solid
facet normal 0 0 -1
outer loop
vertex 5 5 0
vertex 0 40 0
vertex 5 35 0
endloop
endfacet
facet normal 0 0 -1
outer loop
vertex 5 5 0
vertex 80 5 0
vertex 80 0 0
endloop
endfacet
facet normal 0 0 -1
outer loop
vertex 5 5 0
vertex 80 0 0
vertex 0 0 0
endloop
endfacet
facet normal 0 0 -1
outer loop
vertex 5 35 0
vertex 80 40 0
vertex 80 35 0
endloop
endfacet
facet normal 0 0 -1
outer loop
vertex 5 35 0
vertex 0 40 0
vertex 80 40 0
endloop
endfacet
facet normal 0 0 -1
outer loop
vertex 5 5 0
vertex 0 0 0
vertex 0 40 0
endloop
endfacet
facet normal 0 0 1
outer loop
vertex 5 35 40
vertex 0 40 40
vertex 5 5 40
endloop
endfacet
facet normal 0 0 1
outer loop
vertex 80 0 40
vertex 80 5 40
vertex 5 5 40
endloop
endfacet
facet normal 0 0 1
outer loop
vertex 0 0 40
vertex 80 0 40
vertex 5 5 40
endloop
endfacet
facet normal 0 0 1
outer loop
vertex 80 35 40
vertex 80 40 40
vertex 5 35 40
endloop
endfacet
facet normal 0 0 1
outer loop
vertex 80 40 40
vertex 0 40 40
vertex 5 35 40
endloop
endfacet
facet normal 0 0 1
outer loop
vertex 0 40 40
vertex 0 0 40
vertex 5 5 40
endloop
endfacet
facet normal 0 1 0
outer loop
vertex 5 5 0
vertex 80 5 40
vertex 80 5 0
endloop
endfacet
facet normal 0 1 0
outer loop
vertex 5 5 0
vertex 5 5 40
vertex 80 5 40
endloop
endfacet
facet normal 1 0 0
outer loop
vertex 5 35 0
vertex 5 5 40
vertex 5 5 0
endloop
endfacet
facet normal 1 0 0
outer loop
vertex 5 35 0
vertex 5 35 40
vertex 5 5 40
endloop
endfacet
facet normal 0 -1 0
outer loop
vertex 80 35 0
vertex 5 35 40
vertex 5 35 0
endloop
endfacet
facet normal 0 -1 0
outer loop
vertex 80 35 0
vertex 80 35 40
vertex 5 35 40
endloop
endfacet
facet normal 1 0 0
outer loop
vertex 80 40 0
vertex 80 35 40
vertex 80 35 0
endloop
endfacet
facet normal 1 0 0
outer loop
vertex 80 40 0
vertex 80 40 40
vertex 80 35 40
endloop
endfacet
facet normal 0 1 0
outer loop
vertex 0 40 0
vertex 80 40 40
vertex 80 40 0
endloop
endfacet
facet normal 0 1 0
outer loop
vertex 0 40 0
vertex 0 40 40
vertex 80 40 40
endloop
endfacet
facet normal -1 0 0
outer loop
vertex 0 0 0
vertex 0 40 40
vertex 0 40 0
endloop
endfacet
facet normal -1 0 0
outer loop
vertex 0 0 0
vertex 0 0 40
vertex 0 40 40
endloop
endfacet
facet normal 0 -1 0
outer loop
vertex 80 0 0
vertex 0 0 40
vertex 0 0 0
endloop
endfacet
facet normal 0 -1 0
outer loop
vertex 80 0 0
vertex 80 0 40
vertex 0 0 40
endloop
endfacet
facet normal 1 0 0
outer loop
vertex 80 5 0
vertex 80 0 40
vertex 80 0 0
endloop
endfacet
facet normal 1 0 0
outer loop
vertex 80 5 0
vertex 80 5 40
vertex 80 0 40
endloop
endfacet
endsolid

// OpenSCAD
$fn = 32;

// ----------------------------------------------------------------------
// Structural section: channel 80 x 40 mm
// ----------------------------------------------------------------------

// --- parameters (mm) ---
sec_w = 80;               // channel width, X
sec_h = 40;               // channel height, Y
flange_t = 5;             // flange thickness
web_t = 5;                // web thickness
plate_t = 40;             // cut length, Z (extrusion height)

profile = [[0, 0], [80, 0], [80, 5], [5, 5], [5, 35], [80, 35], [80, 40], [0, 40]];  // primary outline, 8 points, counter clockwise

// --- the one profile operation ---
linear_extrude(height = plate_t) polygon(points = profile);
